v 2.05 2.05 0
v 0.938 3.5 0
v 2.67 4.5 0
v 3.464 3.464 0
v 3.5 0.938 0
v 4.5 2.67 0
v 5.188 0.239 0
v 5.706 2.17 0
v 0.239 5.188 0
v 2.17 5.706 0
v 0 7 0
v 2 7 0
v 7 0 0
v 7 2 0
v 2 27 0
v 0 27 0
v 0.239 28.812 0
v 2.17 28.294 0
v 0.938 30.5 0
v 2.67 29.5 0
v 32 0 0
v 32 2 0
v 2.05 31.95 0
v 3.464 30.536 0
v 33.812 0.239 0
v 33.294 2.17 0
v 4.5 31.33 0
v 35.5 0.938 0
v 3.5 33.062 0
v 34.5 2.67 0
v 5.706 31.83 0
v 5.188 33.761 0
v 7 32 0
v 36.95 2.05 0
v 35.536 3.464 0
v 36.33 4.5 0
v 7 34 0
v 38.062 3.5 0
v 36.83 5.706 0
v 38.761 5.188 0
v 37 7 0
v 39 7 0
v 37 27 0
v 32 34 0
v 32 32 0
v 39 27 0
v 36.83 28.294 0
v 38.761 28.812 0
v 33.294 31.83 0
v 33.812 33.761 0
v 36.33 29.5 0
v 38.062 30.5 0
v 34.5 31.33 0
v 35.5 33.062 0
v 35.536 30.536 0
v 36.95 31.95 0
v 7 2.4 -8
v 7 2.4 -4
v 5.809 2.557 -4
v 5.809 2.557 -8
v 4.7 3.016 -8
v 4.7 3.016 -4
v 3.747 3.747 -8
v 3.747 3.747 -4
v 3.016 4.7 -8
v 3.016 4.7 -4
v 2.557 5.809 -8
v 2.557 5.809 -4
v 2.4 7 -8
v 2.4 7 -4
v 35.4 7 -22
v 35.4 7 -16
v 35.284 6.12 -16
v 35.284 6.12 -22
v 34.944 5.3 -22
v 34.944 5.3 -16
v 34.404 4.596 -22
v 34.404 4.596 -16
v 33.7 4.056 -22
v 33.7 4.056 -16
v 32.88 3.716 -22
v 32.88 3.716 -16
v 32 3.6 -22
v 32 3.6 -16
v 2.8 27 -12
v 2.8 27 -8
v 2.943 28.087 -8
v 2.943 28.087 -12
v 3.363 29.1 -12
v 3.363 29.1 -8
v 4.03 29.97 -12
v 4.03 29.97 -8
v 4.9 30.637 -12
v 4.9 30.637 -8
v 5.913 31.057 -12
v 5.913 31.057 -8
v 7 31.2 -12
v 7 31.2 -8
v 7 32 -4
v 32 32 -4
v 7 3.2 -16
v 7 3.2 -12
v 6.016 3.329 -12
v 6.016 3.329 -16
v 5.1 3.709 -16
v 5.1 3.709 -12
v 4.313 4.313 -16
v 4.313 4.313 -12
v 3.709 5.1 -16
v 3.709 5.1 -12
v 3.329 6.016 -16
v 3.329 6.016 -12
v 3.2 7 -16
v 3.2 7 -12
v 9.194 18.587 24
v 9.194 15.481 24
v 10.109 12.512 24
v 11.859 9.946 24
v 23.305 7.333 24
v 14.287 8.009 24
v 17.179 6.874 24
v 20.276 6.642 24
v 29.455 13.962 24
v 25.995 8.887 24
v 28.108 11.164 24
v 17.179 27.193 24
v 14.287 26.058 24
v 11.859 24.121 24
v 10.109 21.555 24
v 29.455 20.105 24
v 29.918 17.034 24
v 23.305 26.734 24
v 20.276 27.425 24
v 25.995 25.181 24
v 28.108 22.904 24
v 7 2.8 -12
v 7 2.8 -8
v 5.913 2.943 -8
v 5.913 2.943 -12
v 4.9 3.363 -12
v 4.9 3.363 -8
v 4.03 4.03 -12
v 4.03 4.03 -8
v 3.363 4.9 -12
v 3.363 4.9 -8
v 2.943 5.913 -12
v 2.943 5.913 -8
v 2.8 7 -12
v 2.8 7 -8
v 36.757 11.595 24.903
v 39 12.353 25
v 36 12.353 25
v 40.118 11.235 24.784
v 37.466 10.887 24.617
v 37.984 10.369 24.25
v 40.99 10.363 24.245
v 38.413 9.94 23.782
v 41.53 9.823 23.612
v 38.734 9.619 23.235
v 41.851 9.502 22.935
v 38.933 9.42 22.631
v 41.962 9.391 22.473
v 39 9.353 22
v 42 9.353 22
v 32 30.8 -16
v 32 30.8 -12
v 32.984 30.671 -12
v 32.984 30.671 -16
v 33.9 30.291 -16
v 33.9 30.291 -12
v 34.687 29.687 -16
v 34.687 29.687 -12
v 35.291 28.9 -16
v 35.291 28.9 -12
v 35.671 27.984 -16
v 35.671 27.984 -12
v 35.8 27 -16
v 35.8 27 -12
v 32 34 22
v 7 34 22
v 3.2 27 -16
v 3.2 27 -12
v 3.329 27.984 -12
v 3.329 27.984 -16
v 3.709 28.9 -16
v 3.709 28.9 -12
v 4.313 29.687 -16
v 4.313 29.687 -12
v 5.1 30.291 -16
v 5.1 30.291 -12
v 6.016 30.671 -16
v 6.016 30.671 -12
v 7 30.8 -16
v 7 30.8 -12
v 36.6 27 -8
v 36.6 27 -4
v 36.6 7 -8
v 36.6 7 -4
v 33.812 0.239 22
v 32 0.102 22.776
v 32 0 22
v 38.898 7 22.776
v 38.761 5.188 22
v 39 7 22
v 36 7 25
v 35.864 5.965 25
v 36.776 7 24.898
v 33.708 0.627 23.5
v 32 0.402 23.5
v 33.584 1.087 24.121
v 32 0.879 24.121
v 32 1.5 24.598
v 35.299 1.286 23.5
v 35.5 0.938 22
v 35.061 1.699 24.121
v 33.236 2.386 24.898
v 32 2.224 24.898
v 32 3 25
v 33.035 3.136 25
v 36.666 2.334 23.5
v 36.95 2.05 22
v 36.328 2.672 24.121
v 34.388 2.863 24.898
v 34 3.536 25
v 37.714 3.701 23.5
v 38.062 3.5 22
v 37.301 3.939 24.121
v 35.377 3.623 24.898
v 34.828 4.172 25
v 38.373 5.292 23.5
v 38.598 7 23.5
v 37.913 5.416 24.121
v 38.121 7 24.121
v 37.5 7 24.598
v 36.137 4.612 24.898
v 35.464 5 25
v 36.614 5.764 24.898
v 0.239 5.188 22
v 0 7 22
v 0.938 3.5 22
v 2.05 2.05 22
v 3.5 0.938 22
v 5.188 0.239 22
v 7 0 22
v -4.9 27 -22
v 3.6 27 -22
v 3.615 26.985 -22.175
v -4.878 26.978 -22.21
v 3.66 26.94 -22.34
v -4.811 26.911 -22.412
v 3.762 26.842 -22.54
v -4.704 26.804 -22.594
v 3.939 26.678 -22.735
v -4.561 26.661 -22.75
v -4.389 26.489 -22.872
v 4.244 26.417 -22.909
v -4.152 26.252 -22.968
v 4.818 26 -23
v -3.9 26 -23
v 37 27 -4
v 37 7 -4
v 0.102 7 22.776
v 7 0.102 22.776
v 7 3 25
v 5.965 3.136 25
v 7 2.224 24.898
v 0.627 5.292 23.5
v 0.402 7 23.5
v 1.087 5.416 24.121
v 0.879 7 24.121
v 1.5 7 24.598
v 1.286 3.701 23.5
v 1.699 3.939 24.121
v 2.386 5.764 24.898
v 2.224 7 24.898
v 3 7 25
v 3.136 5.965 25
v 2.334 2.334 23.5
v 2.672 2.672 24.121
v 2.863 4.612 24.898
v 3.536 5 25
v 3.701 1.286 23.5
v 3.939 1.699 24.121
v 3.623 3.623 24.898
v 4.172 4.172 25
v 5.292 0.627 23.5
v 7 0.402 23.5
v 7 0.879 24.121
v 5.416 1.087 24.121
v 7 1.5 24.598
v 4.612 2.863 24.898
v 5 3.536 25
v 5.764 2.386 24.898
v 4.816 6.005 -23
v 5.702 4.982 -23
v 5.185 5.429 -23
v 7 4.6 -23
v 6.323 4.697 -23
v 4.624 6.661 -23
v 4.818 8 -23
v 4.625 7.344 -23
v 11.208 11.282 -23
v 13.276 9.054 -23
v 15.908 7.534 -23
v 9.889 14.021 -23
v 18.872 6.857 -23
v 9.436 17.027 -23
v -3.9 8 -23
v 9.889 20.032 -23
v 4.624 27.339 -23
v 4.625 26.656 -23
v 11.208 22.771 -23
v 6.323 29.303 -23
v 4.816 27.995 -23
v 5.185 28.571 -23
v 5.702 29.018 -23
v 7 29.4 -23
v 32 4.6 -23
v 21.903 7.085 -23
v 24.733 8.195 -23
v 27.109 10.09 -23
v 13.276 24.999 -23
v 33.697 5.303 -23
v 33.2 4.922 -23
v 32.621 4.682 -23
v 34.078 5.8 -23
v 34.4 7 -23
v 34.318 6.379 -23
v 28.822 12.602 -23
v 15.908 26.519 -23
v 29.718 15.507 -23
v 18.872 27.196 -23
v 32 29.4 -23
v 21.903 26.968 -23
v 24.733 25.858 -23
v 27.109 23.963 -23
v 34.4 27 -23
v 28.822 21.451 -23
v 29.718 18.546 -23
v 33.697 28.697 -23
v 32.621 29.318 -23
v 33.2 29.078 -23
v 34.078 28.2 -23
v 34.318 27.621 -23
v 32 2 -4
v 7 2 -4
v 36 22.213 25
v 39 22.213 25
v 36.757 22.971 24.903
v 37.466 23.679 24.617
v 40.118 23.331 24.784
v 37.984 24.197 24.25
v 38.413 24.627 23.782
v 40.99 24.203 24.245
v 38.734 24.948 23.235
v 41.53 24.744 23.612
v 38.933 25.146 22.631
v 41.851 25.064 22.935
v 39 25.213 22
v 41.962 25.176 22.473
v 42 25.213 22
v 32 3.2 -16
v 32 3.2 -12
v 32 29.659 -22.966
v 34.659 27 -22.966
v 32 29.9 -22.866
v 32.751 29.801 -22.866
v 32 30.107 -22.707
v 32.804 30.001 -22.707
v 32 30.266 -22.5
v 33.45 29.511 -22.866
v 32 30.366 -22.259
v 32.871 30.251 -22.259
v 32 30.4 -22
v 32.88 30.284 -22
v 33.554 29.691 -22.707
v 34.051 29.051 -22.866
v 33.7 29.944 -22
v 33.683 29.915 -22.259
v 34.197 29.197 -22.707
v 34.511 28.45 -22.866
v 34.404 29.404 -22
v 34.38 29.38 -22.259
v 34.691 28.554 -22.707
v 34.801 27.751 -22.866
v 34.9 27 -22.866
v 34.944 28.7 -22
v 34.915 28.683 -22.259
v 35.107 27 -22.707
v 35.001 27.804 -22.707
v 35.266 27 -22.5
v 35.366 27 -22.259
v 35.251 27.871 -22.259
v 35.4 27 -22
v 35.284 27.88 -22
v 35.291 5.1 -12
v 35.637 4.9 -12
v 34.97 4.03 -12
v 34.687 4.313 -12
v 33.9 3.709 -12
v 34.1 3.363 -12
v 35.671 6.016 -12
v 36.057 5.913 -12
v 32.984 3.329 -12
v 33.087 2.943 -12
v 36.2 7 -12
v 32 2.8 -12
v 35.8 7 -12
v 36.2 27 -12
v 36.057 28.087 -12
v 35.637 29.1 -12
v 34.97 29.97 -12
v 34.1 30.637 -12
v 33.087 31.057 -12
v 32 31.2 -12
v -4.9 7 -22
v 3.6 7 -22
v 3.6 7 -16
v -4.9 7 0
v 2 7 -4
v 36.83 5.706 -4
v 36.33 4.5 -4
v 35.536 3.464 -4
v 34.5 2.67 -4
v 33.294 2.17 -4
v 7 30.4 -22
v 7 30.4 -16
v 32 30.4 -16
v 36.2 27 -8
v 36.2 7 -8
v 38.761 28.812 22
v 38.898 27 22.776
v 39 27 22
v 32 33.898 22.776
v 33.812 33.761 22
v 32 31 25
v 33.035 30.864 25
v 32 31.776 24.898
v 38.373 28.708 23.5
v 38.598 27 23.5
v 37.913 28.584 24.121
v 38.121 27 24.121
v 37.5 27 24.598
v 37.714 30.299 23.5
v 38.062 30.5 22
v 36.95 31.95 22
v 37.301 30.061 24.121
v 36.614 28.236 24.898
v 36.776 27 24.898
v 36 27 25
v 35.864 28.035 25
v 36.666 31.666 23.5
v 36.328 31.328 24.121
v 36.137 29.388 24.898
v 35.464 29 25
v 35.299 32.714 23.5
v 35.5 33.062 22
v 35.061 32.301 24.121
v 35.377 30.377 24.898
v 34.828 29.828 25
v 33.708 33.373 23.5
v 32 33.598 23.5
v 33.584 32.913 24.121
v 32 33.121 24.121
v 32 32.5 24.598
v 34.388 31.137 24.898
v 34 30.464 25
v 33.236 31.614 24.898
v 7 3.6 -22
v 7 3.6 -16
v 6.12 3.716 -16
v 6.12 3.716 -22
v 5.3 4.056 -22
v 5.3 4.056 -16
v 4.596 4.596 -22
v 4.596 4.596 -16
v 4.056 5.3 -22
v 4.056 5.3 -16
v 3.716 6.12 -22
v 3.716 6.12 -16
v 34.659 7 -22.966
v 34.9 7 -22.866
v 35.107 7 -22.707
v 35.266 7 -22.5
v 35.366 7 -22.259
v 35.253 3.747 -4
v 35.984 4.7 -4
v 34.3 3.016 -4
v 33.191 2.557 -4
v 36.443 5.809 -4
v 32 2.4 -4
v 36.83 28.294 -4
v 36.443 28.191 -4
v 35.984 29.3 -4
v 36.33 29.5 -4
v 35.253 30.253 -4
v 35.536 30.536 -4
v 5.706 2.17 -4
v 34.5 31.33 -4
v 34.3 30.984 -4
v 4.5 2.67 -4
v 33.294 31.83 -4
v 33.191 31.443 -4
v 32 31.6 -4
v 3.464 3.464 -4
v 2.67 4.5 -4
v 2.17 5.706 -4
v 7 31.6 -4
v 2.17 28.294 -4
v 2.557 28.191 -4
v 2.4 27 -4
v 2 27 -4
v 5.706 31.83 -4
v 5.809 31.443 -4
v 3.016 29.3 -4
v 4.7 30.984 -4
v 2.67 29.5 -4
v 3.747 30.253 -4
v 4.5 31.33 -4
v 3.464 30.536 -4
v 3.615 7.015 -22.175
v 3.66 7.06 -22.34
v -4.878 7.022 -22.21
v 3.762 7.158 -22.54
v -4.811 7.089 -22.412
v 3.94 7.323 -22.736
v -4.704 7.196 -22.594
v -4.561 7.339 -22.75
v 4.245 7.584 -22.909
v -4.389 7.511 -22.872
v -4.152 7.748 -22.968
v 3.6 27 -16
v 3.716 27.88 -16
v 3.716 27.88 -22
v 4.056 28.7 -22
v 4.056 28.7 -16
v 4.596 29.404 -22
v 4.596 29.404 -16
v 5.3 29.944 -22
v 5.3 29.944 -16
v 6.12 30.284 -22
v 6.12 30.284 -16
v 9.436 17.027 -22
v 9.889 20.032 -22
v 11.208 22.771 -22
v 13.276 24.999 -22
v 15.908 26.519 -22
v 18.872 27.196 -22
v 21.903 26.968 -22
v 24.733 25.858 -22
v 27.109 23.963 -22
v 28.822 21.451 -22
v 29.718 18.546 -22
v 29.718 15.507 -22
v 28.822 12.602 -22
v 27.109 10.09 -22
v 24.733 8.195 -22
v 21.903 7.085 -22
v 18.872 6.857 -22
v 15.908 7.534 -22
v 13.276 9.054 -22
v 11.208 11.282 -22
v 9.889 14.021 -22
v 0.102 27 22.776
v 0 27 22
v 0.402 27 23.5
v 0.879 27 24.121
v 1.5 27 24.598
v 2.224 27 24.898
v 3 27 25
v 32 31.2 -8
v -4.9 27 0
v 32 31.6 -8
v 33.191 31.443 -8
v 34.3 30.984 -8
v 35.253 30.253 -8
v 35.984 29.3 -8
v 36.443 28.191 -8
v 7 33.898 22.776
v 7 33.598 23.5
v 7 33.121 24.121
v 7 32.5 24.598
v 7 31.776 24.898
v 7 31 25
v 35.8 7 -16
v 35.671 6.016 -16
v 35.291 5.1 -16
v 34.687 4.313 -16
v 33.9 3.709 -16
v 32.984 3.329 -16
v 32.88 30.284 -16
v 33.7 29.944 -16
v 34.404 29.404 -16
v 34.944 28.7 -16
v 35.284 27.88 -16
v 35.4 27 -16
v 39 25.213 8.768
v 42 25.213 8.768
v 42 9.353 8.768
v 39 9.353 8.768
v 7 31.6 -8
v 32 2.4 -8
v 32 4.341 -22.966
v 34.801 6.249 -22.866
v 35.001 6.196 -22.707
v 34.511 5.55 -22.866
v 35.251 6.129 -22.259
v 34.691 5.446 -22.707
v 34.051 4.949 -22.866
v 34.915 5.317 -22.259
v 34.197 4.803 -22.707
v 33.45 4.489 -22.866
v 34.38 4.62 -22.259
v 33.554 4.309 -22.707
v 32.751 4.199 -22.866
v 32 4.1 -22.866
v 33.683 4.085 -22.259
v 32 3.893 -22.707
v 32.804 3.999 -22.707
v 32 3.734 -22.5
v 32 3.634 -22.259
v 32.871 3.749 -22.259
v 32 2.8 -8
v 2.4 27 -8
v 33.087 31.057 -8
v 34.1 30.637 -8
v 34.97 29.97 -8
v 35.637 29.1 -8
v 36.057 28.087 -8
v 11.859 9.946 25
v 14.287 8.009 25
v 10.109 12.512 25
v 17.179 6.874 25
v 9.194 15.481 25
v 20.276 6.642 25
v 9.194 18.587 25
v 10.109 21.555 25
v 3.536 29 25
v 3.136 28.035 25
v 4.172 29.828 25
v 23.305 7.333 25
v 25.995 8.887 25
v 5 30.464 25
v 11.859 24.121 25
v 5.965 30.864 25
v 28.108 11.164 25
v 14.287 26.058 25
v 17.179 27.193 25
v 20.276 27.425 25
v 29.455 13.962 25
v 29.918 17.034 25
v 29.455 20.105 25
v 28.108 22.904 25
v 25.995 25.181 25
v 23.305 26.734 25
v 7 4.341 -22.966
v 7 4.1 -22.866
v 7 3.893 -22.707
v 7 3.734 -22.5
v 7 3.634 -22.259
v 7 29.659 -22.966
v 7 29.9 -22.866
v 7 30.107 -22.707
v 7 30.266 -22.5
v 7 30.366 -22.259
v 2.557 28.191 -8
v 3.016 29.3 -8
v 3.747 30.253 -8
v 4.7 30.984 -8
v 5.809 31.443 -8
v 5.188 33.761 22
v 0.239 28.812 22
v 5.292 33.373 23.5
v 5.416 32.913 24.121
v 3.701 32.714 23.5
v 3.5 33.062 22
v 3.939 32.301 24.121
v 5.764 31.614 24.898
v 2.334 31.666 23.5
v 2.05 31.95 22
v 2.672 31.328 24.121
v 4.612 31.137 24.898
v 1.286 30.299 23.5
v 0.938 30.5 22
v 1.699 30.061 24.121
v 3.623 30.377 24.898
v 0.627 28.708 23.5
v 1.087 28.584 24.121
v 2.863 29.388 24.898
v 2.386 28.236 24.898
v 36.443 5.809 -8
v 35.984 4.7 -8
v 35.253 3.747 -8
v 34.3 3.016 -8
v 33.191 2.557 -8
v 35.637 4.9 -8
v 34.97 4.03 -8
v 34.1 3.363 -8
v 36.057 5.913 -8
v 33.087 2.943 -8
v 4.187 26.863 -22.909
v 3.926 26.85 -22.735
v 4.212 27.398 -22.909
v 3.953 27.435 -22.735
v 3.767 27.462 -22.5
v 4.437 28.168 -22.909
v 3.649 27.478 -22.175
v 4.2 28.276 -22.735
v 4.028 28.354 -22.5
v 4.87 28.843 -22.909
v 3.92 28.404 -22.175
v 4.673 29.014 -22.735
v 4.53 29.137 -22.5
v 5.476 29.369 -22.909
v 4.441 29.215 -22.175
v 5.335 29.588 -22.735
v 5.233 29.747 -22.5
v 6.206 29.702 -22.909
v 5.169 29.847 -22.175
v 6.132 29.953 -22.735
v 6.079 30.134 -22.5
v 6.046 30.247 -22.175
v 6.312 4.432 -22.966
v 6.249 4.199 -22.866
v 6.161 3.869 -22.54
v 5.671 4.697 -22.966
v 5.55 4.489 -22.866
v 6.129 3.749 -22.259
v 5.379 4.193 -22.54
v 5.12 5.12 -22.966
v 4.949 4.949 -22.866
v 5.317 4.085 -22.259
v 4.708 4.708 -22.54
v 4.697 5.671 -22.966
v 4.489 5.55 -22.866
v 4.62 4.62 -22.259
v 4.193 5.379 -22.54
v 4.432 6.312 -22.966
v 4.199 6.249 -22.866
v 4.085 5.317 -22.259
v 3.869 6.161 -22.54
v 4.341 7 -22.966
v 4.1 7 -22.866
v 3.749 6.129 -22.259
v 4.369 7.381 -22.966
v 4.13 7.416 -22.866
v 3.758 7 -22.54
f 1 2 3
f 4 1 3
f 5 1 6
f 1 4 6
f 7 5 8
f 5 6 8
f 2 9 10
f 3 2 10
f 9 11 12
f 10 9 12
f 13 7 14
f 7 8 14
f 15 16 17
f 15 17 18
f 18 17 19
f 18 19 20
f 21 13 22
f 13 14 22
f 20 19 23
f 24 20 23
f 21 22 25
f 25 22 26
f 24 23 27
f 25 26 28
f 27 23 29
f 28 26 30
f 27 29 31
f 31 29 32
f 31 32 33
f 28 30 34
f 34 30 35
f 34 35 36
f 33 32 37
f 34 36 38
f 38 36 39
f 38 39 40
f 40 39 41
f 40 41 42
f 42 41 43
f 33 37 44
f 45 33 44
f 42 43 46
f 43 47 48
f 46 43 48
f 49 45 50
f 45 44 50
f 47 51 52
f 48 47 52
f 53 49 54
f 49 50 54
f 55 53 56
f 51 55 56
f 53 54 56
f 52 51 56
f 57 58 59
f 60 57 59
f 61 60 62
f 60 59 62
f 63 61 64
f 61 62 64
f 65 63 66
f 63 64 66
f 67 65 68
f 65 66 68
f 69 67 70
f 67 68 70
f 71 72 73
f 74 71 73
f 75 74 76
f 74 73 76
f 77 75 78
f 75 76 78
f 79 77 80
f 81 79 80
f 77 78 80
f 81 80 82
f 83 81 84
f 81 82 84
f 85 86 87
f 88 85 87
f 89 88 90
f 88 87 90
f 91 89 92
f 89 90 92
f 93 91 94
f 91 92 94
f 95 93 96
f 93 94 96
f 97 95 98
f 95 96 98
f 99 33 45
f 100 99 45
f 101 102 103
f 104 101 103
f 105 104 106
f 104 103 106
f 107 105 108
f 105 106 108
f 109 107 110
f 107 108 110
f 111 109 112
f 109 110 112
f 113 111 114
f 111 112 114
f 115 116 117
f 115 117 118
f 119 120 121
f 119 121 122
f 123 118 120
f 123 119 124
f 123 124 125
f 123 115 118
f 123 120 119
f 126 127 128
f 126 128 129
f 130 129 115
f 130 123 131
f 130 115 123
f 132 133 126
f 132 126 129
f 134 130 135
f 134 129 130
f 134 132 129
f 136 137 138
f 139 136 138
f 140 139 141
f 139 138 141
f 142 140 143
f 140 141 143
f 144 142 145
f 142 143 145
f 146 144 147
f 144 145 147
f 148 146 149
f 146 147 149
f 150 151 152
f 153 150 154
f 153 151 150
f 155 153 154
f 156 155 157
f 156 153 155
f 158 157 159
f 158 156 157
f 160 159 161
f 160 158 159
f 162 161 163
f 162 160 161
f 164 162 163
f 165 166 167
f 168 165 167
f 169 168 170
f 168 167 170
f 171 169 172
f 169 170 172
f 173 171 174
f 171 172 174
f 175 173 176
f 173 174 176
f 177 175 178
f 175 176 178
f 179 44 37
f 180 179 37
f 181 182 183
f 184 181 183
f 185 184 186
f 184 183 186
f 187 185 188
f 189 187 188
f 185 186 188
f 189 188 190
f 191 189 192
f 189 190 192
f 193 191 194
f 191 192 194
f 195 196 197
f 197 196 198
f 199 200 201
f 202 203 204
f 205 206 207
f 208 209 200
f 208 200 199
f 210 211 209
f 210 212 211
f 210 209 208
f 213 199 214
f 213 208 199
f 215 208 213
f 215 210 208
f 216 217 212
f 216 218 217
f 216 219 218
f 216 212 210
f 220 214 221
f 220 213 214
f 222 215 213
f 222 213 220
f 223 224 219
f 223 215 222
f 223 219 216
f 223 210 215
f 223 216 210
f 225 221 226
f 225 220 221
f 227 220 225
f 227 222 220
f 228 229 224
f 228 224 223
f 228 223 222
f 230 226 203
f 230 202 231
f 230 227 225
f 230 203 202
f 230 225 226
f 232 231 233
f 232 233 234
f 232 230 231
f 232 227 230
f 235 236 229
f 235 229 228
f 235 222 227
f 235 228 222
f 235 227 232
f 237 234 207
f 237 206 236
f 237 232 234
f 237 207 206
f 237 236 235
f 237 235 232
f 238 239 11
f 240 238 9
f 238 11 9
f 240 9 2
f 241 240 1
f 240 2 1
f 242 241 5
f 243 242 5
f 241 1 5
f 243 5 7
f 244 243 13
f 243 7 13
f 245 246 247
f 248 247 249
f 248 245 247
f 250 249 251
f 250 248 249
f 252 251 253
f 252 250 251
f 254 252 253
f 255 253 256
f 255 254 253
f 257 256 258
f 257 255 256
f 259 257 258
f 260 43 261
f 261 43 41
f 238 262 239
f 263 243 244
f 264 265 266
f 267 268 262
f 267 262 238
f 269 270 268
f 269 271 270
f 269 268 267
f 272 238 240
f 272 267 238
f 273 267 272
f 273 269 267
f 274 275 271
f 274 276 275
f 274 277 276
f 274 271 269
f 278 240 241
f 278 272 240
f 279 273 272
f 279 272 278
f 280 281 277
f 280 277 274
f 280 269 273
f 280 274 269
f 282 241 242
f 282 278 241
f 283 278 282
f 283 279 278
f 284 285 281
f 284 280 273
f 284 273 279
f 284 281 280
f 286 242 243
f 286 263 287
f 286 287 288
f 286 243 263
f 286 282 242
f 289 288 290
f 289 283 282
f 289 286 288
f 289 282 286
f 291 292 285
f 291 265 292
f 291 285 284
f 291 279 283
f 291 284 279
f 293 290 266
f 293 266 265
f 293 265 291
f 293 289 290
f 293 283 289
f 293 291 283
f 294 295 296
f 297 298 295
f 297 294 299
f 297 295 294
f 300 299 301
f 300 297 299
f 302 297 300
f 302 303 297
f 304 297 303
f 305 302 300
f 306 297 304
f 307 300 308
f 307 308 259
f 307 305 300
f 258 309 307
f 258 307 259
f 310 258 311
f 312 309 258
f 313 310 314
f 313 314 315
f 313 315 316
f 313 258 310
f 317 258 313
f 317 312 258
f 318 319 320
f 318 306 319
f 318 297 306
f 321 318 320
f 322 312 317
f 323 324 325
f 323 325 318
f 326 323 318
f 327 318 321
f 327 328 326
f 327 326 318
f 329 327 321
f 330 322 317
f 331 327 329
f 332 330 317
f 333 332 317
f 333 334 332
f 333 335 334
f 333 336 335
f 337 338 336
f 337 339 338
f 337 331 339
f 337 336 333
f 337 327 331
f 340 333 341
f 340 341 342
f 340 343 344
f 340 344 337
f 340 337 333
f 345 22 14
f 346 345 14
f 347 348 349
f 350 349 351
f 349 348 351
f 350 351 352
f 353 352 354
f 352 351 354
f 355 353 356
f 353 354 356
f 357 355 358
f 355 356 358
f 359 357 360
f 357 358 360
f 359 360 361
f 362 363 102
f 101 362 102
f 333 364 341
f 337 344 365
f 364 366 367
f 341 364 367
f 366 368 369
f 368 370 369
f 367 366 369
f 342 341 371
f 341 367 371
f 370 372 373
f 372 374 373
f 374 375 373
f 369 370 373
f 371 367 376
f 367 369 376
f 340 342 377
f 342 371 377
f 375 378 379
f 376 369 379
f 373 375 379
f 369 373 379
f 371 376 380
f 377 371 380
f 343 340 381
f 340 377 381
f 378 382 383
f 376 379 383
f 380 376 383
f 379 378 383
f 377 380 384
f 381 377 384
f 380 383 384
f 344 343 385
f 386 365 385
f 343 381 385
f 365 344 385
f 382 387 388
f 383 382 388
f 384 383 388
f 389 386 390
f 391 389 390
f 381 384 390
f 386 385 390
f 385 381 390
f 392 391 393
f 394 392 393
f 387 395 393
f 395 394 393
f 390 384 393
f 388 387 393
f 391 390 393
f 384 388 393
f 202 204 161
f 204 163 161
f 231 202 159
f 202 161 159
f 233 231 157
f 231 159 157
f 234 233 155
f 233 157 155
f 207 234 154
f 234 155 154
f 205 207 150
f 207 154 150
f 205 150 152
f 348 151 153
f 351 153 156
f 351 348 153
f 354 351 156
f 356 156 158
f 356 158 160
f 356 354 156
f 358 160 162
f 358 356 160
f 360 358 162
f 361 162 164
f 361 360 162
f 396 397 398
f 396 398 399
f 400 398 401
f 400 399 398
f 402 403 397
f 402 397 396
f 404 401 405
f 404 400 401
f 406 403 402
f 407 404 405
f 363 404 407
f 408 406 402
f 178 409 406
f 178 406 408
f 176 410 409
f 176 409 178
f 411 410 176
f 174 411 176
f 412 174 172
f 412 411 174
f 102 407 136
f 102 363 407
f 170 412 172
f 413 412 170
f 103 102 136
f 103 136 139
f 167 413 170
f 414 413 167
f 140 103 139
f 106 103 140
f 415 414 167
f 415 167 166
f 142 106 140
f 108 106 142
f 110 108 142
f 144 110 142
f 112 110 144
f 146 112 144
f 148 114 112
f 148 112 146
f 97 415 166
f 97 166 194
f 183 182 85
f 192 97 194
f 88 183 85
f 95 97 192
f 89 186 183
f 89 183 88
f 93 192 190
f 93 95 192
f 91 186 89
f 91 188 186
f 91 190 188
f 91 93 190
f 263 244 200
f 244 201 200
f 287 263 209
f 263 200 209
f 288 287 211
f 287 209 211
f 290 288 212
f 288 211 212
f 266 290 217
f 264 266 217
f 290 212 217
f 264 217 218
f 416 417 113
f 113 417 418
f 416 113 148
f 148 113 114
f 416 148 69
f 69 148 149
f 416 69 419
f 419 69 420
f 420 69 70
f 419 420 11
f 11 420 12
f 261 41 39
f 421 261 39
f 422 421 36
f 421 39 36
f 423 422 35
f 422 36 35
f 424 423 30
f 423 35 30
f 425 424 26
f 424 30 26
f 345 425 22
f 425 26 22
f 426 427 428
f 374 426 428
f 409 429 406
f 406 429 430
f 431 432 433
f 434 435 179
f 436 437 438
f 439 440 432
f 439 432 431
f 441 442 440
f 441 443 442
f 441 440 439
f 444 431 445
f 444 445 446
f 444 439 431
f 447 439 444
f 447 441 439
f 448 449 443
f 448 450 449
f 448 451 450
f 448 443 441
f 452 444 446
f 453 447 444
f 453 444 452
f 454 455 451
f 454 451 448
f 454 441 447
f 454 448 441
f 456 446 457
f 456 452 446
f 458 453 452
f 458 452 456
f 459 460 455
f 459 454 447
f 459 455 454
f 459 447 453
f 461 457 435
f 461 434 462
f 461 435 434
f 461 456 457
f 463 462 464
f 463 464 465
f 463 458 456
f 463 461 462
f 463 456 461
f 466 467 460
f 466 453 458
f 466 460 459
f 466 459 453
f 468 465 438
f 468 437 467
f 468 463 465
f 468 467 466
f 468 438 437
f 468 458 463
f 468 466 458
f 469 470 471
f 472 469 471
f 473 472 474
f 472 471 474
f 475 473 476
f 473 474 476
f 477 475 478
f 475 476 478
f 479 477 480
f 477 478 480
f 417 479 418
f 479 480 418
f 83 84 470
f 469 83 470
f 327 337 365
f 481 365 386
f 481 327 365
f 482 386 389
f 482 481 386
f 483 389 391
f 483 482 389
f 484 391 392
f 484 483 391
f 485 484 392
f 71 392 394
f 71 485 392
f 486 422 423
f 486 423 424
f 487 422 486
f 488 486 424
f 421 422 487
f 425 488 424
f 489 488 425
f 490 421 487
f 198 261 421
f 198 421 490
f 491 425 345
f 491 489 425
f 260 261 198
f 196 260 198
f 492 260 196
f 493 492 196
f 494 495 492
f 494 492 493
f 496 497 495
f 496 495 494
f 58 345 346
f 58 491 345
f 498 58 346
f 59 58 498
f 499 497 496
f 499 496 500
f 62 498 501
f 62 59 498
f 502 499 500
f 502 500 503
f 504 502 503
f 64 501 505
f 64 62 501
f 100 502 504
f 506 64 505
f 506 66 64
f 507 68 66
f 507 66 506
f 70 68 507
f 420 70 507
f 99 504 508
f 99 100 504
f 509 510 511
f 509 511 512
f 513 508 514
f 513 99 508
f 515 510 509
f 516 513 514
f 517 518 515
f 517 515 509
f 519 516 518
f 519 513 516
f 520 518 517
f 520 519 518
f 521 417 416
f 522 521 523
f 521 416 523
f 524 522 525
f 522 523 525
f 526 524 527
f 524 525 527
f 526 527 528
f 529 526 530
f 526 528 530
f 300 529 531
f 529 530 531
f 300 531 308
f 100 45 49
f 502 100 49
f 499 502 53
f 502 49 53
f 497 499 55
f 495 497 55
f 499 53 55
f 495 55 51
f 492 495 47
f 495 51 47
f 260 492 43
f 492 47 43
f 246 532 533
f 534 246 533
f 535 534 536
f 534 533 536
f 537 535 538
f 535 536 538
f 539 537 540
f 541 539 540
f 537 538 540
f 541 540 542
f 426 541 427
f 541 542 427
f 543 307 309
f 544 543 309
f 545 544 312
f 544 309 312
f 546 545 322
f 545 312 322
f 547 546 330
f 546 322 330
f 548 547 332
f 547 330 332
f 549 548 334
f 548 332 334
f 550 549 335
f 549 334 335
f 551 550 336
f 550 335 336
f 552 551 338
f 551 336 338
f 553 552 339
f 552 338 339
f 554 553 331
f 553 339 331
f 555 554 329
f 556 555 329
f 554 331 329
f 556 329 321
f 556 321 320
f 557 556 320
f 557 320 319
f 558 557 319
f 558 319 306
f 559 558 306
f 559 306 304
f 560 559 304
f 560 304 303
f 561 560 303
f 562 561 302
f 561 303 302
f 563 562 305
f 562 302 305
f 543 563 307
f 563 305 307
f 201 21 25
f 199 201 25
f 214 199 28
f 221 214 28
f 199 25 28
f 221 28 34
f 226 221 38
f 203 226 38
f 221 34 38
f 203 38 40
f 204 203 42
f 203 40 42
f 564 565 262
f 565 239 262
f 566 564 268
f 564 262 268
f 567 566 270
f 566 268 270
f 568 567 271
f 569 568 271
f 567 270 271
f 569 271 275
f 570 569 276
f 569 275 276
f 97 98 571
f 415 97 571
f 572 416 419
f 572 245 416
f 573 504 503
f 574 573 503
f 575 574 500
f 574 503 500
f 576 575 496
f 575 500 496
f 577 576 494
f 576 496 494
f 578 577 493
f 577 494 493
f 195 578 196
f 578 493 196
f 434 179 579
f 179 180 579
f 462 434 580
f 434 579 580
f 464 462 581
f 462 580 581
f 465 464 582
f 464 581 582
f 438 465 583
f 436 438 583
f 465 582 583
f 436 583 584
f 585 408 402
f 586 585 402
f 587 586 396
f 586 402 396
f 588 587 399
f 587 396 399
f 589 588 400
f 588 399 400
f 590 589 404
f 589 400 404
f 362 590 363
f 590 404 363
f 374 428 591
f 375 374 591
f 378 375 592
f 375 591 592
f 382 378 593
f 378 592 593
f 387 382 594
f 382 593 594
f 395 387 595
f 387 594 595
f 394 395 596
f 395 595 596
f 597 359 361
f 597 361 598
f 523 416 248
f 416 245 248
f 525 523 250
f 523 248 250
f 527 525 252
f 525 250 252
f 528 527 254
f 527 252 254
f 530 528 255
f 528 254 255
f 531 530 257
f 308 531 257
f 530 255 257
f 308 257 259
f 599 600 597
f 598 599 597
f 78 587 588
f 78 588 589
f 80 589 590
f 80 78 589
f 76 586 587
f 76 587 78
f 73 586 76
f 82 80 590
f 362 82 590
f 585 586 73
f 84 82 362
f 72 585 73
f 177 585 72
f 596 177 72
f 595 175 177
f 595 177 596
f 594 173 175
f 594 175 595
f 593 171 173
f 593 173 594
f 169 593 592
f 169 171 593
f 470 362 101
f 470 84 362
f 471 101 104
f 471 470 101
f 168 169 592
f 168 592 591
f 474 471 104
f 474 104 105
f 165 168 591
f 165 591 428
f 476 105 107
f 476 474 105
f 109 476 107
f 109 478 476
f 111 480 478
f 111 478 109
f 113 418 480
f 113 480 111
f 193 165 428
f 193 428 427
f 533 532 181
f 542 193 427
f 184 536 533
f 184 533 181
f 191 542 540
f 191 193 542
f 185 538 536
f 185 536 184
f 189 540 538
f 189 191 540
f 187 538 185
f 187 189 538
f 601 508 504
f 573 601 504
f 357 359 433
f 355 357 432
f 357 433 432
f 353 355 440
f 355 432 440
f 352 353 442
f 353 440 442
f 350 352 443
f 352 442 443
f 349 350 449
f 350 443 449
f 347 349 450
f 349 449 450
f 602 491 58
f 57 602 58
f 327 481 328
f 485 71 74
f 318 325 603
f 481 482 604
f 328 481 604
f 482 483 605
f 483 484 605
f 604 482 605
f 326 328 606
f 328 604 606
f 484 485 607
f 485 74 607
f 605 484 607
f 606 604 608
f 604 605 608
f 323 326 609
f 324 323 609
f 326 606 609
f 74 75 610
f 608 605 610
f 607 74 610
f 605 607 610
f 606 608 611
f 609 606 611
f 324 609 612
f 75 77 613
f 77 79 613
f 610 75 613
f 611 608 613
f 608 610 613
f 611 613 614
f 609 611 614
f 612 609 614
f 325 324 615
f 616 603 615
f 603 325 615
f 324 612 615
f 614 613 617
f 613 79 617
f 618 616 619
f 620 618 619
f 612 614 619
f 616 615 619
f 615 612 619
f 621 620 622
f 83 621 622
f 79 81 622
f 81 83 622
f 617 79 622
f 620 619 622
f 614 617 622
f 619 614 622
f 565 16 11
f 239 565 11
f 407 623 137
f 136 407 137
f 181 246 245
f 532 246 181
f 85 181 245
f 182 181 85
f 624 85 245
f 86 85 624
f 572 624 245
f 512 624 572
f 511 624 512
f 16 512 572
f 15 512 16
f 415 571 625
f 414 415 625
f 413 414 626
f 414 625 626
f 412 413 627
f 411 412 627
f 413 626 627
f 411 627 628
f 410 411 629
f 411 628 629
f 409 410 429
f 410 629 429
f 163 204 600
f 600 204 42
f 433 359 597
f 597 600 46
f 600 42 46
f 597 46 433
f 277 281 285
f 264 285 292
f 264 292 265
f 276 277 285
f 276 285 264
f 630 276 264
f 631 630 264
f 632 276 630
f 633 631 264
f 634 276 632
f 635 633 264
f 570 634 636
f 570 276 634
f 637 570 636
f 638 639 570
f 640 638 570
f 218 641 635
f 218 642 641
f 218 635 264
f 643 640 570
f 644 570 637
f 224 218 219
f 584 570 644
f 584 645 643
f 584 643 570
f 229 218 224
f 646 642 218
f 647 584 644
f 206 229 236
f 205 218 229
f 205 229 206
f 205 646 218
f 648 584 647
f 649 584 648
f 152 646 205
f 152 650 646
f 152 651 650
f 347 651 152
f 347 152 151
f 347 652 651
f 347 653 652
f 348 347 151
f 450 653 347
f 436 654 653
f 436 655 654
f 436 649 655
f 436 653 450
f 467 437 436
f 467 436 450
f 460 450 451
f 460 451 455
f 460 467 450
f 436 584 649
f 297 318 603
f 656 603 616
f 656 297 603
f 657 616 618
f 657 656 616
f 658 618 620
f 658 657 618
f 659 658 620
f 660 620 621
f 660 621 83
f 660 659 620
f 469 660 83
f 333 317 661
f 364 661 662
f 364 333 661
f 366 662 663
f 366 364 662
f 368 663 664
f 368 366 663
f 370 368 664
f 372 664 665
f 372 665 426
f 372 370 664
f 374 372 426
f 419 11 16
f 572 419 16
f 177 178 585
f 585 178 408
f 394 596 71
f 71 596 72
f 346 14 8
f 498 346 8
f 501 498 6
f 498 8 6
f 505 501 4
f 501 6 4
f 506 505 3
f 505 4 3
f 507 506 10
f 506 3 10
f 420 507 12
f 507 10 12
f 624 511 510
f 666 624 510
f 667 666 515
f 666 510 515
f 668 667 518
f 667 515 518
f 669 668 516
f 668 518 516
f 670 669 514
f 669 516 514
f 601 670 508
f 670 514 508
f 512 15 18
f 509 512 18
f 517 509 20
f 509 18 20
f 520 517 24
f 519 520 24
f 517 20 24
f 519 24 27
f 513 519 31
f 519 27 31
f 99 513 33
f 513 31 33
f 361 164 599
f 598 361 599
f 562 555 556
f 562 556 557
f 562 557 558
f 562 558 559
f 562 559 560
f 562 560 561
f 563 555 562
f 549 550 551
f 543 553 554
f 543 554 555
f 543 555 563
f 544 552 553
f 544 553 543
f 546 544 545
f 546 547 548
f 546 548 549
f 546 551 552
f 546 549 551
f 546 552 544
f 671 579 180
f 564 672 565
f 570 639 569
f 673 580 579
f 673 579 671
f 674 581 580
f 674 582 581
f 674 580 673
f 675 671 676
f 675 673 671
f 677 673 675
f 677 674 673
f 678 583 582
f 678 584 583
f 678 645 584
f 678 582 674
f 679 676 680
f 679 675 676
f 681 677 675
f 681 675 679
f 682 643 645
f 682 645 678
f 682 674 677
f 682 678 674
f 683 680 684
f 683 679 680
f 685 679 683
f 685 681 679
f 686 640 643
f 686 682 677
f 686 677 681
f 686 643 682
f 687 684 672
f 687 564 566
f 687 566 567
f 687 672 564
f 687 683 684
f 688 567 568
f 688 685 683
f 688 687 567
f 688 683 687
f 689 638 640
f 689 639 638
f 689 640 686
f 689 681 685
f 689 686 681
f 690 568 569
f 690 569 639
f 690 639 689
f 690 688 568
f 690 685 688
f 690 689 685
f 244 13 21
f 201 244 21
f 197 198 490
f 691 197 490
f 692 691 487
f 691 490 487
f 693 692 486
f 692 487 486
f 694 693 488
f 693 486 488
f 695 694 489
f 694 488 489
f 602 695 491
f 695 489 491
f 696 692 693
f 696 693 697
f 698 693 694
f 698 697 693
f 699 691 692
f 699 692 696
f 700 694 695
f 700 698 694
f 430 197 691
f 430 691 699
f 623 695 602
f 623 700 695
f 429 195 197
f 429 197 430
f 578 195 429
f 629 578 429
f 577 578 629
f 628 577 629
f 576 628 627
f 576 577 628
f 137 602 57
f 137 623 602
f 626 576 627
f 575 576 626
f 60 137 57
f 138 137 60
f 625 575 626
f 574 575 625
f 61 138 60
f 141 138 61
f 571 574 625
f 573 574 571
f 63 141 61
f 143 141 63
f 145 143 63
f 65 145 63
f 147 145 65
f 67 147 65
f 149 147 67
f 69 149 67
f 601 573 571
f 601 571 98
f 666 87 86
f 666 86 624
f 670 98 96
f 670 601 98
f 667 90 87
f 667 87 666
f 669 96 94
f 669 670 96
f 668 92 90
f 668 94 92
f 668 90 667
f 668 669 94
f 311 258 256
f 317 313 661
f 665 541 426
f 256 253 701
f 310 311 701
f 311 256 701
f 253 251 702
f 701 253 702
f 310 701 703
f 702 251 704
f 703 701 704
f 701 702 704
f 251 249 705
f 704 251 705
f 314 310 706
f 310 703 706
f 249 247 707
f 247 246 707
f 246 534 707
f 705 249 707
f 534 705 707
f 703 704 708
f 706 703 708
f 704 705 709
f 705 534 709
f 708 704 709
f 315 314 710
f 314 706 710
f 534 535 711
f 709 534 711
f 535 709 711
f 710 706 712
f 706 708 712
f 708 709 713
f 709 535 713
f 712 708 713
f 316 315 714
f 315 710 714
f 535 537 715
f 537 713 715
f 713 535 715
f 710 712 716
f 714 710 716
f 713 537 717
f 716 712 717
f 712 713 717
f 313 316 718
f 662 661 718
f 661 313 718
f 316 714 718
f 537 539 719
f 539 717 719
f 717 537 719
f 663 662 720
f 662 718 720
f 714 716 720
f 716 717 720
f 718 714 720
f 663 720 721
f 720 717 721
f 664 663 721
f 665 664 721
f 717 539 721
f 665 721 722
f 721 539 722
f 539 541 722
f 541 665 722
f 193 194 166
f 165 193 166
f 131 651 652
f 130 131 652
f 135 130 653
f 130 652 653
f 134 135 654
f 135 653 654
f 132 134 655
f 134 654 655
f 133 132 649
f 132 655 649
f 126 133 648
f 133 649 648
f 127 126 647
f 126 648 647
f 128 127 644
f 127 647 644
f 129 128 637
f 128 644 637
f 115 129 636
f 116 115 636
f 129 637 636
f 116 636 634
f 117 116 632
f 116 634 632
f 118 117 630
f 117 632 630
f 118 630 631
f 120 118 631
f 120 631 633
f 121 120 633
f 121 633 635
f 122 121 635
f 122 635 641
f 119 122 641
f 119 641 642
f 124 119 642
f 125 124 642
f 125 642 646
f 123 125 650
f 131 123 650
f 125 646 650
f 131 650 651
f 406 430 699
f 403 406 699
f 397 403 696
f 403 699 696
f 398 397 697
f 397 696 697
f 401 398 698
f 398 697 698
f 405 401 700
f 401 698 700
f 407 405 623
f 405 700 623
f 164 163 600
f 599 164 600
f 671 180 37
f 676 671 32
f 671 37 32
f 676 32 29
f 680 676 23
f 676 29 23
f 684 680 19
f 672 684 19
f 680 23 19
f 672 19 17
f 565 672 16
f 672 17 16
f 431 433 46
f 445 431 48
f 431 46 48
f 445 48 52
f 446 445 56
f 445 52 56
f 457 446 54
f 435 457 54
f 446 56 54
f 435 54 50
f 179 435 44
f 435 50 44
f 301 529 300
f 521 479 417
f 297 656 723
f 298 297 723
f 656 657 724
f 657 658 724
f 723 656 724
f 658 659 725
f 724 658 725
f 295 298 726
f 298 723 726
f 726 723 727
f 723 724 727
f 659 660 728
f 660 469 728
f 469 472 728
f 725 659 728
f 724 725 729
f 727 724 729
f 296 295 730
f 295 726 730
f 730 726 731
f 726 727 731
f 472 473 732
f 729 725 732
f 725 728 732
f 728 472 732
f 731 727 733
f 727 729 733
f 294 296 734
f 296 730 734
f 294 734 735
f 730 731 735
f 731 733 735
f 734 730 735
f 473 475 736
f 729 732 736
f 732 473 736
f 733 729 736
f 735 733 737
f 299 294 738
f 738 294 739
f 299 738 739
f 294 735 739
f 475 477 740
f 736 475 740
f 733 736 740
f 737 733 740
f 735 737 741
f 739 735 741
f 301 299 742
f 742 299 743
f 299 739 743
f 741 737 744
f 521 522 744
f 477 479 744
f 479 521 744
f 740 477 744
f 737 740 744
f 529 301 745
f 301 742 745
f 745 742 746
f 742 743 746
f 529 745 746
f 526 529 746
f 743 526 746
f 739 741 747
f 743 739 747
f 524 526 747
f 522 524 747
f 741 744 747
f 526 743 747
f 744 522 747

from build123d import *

# Parameters (mm, degrees)
EXTRUDE_1_DEPTH     = 25
EXTRUDE_3_DEPTH     = 4
EXTRUDE_4_DEPTH     = 4
EXTRUDE_5_DEPTH     = 4
EXTRUDE_6_DEPTH     = 4
EXTRUDE_7_DEPTH     = 7
SKETCH_7_W          = 23
SKETCH_7_H          = 20
EXTRUDE_8_DEPTH     = 8.5
SKETCH_8_W          = 16.231712275
SKETCH_8_H          = 15.860541866
EXTRUDE_9_DEPTH     = 3
FILLET_1_R          = 3
FILLET_2_R          = 1
SKETCH_9_R          = 10.42057087
CUT_EXTRUDE_1_DEPTH = 1
SKETCH_10_R         = 10.197555966
CUT_EXTRUDE_2_DEPTH = 1


with BuildPart() as part:
    # ｽｹｯﾁ1 → ﾎﾞｽ - 押し出し1 (new body)
    with BuildSketch(Plane.XY):
        with BuildLine():
            Line((7, 0), (32, 0))
            ThreePointArc((32, 0), (36.949747468, 2.050252532), (39, 7))
            Line((39, 7), (39, 27))
            ThreePointArc((39, 27), (36.949747468, 31.949747468), (32, 34))
            Line((32, 34), (7, 34))
            ThreePointArc((7, 34), (2.050252532, 31.949747468), (0, 27))
            Line((0, 27), (0, 7))
            ThreePointArc((0, 7), (2.050252532, 2.050252532), (7, 0))
        make_face()
    extrude(amount=EXTRUDE_1_DEPTH)

    # ｽｹｯﾁ2 → ﾎﾞｽ - 押し出し3 (add)
    with BuildSketch(Plane(origin=(0, 0, 0), x_dir=(-1, 0, 0), z_dir=(0, 0, -1))):
        with BuildLine():
            Line((-37, 27), (-37, 7))
            ThreePointArc((-37, 7), (-35.535533906, 3.464466094), (-32, 2))
            Line((-32, 2), (-7, 2))
            ThreePointArc((-7, 2), (-3.464466094, 3.464466094), (-2, 7))
            Line((-2, 7), (-2, 27))
            ThreePointArc((-2, 27), (-3.464466094, 30.535533906), (-7, 32))
            Line((-7, 32), (-32, 32))
            ThreePointArc((-32, 32), (-35.535533906, 30.535533906), (-37, 27))
        make_face()
    extrude(amount=EXTRUDE_3_DEPTH)

    # ｽｹｯﾁ3 → ﾎﾞｽ - 押し出し4 (add)
    with BuildSketch(Plane(origin=(0, 0, -4), x_dir=(-1, 0, 0), z_dir=(0, 0, -1))):
        with BuildLine():
            Line((-32, 2.4), (-7, 2.4))
            ThreePointArc((-7, 2.4), (-3.747308807, 3.747308807), (-2.4, 7))
            Line((-2.4, 7), (-2.4, 27))
            ThreePointArc((-2.4, 27), (-3.747308807, 30.252691193), (-7, 31.6))
            Line((-7, 31.6), (-32, 31.6))
            ThreePointArc((-32, 31.6), (-35.252691193, 30.252691193), (-36.6, 27))
            Line((-36.6, 27), (-36.6, 7))
            ThreePointArc((-36.6, 7), (-35.252691193, 3.747308807), (-32, 2.4))
        make_face()
    extrude(amount=EXTRUDE_4_DEPTH)

    # ｽｹｯﾁ4 → ﾎﾞｽ - 押し出し5 (add)
    with BuildSketch(Plane(origin=(0, 0, -8), x_dir=(-1, 0, 0), z_dir=(0, 0, -1))):
        with BuildLine():
            Line((-36.2, 27), (-36.2, 7))
            ThreePointArc((-36.2, 7), (-34.969848481, 4.030151519), (-32, 2.8))
            Line((-32, 2.8), (-7, 2.8))
            ThreePointArc((-7, 2.8), (-4.030151519, 4.030151519), (-2.8, 7))
            Line((-2.8, 7), (-2.8, 27))
            ThreePointArc((-2.8, 27), (-4.030151519, 29.969848481), (-7, 31.2))
            Line((-7, 31.2), (-32, 31.2))
            ThreePointArc((-32, 31.2), (-34.969848481, 29.969848481), (-36.2, 27))
        make_face()
    extrude(amount=EXTRUDE_5_DEPTH)

    # ｽｹｯﾁ5 → ﾎﾞｽ - 押し出し6 (add)
    with BuildSketch(Plane(origin=(0, 0, -12), x_dir=(-1, 0, 0), z_dir=(0, 0, -1))):
        with BuildLine():
            Line((-35.8, 27), (-35.8, 7))
            ThreePointArc((-35.8, 7), (-34.687005769, 4.312994231), (-32, 3.2))
            Line((-32, 3.2), (-7, 3.2))
            ThreePointArc((-7, 3.2), (-4.312994231, 4.312994231), (-3.2, 7))
            Line((-3.2, 7), (-3.2, 27))
            ThreePointArc((-3.2, 27), (-4.312994231, 29.687005769), (-7, 30.8))
            Line((-7, 30.8), (-32, 30.8))
            ThreePointArc((-32, 30.8), (-34.687005769, 29.687005769), (-35.8, 27))
        make_face()
    extrude(amount=EXTRUDE_6_DEPTH)

    # ｽｹｯﾁ6 → ﾎﾞｽ - 押し出し7 (add)
    with BuildSketch(Plane(origin=(0, 0, -16), x_dir=(-1, 0, 0), z_dir=(0, 0, -1))):
        with BuildLine():
            Line((-35.4, 27), (-35.4, 7))
            ThreePointArc((-35.4, 7), (-34.404163056, 4.595836944), (-32, 3.6))
            Line((-32, 3.6), (-7, 3.6))
            ThreePointArc((-7, 3.6), (-4.595836944, 4.595836944), (-3.6, 7))
            Line((-3.6, 7), (-3.6, 27))
            ThreePointArc((-3.6, 27), (-4.595836944, 29.404163056), (-7, 30.4))
            Line((-7, 30.4), (-32, 30.4))
            ThreePointArc((-32, 30.4), (-34.404163056, 29.404163056), (-35.4, 27))
        make_face()
    extrude(amount=EXTRUDE_7_DEPTH)

    # ｽｹｯﾁ7 → ﾎﾞｽ - 押し出し8 (add)
    with BuildSketch(Plane.ZY.offset(-3.6)):
        with Locations((-11.5, 17)):
            Rectangle(SKETCH_7_W, SKETCH_7_H)
    extrude(amount=EXTRUDE_8_DEPTH)

    # ｽｹｯﾁ8 → ﾎﾞｽ - 押し出し9 (add)
    with BuildSketch(Plane(origin=(39, 0, 0), x_dir=(0, 0, -1), z_dir=(1, 0, 0))):
        with Locations((-16.884143863, 17.283223962)):
            Rectangle(SKETCH_8_W, SKETCH_8_H)
    extrude(amount=EXTRUDE_9_DEPTH)

    # ﾌｨﾚｯﾄ1
    fillet_1_edges = [part.edges().sort_by_distance(p)[0] for p in [
        (39, 26.106747447, 25),
        (40.5, 25.213494895, 25),
        (42, 17.283223962, 25),
        (40.5, 9.352953029, 25),
        (39, 8.176476514, 25),
        (36.949747468, 2.050252532, 25),
        (19.5, 0, 25),
        (2.050252532, 2.050252532, 25),
        (0, 17, 25),
        (2.050252532, 31.949747468, 25),
        (19.5, 34, 25),
        (36.949747468, 31.949747468, 25),
    ]]
    fillet(fillet_1_edges, radius=FILLET_1_R)

    # ﾌｨﾚｯﾄ2
    fillet_2_edges = [part.edges().sort_by_distance(p)[0] for p in [
        (34.404163056, 29.404163056, -23),
        (35.4, 17, -23),
        (34.404163056, 4.595836944, -23),
        (19.5, 3.6, -23),
        (4.595836944, 4.595836944, -23),
        (4.595836944, 29.404163056, -23),
        (19.5, 30.4, -23),
        (-0.65, 7, -23),
        (-0.65, 27, -23),
        (-4.9, 17, -23),
    ]]
    fillet(fillet_2_edges, radius=FILLET_2_R)

    # ｽｹｯﾁ9 → ｶｯﾄ - 押し出し1 (cut)
    with BuildSketch(Plane.XY.offset(25)):
        with Locations((19.497752913, 17.033640908)):
            Circle(SKETCH_9_R)
    extrude(amount=-CUT_EXTRUDE_1_DEPTH, mode=Mode.SUBTRACT)

    # ｽｹｯﾁ10 → ｶｯﾄ - 押し出し2 (cut)
    with BuildSketch(Plane(origin=(0, 0, -23), x_dir=(-1, 0, 0), z_dir=(0, 0, -1))):
        with Locations((-19.633872533, 17.026501787)):
            Circle(SKETCH_10_R)
    extrude(amount=-CUT_EXTRUDE_2_DEPTH, mode=Mode.SUBTRACT)


solid = part.part
